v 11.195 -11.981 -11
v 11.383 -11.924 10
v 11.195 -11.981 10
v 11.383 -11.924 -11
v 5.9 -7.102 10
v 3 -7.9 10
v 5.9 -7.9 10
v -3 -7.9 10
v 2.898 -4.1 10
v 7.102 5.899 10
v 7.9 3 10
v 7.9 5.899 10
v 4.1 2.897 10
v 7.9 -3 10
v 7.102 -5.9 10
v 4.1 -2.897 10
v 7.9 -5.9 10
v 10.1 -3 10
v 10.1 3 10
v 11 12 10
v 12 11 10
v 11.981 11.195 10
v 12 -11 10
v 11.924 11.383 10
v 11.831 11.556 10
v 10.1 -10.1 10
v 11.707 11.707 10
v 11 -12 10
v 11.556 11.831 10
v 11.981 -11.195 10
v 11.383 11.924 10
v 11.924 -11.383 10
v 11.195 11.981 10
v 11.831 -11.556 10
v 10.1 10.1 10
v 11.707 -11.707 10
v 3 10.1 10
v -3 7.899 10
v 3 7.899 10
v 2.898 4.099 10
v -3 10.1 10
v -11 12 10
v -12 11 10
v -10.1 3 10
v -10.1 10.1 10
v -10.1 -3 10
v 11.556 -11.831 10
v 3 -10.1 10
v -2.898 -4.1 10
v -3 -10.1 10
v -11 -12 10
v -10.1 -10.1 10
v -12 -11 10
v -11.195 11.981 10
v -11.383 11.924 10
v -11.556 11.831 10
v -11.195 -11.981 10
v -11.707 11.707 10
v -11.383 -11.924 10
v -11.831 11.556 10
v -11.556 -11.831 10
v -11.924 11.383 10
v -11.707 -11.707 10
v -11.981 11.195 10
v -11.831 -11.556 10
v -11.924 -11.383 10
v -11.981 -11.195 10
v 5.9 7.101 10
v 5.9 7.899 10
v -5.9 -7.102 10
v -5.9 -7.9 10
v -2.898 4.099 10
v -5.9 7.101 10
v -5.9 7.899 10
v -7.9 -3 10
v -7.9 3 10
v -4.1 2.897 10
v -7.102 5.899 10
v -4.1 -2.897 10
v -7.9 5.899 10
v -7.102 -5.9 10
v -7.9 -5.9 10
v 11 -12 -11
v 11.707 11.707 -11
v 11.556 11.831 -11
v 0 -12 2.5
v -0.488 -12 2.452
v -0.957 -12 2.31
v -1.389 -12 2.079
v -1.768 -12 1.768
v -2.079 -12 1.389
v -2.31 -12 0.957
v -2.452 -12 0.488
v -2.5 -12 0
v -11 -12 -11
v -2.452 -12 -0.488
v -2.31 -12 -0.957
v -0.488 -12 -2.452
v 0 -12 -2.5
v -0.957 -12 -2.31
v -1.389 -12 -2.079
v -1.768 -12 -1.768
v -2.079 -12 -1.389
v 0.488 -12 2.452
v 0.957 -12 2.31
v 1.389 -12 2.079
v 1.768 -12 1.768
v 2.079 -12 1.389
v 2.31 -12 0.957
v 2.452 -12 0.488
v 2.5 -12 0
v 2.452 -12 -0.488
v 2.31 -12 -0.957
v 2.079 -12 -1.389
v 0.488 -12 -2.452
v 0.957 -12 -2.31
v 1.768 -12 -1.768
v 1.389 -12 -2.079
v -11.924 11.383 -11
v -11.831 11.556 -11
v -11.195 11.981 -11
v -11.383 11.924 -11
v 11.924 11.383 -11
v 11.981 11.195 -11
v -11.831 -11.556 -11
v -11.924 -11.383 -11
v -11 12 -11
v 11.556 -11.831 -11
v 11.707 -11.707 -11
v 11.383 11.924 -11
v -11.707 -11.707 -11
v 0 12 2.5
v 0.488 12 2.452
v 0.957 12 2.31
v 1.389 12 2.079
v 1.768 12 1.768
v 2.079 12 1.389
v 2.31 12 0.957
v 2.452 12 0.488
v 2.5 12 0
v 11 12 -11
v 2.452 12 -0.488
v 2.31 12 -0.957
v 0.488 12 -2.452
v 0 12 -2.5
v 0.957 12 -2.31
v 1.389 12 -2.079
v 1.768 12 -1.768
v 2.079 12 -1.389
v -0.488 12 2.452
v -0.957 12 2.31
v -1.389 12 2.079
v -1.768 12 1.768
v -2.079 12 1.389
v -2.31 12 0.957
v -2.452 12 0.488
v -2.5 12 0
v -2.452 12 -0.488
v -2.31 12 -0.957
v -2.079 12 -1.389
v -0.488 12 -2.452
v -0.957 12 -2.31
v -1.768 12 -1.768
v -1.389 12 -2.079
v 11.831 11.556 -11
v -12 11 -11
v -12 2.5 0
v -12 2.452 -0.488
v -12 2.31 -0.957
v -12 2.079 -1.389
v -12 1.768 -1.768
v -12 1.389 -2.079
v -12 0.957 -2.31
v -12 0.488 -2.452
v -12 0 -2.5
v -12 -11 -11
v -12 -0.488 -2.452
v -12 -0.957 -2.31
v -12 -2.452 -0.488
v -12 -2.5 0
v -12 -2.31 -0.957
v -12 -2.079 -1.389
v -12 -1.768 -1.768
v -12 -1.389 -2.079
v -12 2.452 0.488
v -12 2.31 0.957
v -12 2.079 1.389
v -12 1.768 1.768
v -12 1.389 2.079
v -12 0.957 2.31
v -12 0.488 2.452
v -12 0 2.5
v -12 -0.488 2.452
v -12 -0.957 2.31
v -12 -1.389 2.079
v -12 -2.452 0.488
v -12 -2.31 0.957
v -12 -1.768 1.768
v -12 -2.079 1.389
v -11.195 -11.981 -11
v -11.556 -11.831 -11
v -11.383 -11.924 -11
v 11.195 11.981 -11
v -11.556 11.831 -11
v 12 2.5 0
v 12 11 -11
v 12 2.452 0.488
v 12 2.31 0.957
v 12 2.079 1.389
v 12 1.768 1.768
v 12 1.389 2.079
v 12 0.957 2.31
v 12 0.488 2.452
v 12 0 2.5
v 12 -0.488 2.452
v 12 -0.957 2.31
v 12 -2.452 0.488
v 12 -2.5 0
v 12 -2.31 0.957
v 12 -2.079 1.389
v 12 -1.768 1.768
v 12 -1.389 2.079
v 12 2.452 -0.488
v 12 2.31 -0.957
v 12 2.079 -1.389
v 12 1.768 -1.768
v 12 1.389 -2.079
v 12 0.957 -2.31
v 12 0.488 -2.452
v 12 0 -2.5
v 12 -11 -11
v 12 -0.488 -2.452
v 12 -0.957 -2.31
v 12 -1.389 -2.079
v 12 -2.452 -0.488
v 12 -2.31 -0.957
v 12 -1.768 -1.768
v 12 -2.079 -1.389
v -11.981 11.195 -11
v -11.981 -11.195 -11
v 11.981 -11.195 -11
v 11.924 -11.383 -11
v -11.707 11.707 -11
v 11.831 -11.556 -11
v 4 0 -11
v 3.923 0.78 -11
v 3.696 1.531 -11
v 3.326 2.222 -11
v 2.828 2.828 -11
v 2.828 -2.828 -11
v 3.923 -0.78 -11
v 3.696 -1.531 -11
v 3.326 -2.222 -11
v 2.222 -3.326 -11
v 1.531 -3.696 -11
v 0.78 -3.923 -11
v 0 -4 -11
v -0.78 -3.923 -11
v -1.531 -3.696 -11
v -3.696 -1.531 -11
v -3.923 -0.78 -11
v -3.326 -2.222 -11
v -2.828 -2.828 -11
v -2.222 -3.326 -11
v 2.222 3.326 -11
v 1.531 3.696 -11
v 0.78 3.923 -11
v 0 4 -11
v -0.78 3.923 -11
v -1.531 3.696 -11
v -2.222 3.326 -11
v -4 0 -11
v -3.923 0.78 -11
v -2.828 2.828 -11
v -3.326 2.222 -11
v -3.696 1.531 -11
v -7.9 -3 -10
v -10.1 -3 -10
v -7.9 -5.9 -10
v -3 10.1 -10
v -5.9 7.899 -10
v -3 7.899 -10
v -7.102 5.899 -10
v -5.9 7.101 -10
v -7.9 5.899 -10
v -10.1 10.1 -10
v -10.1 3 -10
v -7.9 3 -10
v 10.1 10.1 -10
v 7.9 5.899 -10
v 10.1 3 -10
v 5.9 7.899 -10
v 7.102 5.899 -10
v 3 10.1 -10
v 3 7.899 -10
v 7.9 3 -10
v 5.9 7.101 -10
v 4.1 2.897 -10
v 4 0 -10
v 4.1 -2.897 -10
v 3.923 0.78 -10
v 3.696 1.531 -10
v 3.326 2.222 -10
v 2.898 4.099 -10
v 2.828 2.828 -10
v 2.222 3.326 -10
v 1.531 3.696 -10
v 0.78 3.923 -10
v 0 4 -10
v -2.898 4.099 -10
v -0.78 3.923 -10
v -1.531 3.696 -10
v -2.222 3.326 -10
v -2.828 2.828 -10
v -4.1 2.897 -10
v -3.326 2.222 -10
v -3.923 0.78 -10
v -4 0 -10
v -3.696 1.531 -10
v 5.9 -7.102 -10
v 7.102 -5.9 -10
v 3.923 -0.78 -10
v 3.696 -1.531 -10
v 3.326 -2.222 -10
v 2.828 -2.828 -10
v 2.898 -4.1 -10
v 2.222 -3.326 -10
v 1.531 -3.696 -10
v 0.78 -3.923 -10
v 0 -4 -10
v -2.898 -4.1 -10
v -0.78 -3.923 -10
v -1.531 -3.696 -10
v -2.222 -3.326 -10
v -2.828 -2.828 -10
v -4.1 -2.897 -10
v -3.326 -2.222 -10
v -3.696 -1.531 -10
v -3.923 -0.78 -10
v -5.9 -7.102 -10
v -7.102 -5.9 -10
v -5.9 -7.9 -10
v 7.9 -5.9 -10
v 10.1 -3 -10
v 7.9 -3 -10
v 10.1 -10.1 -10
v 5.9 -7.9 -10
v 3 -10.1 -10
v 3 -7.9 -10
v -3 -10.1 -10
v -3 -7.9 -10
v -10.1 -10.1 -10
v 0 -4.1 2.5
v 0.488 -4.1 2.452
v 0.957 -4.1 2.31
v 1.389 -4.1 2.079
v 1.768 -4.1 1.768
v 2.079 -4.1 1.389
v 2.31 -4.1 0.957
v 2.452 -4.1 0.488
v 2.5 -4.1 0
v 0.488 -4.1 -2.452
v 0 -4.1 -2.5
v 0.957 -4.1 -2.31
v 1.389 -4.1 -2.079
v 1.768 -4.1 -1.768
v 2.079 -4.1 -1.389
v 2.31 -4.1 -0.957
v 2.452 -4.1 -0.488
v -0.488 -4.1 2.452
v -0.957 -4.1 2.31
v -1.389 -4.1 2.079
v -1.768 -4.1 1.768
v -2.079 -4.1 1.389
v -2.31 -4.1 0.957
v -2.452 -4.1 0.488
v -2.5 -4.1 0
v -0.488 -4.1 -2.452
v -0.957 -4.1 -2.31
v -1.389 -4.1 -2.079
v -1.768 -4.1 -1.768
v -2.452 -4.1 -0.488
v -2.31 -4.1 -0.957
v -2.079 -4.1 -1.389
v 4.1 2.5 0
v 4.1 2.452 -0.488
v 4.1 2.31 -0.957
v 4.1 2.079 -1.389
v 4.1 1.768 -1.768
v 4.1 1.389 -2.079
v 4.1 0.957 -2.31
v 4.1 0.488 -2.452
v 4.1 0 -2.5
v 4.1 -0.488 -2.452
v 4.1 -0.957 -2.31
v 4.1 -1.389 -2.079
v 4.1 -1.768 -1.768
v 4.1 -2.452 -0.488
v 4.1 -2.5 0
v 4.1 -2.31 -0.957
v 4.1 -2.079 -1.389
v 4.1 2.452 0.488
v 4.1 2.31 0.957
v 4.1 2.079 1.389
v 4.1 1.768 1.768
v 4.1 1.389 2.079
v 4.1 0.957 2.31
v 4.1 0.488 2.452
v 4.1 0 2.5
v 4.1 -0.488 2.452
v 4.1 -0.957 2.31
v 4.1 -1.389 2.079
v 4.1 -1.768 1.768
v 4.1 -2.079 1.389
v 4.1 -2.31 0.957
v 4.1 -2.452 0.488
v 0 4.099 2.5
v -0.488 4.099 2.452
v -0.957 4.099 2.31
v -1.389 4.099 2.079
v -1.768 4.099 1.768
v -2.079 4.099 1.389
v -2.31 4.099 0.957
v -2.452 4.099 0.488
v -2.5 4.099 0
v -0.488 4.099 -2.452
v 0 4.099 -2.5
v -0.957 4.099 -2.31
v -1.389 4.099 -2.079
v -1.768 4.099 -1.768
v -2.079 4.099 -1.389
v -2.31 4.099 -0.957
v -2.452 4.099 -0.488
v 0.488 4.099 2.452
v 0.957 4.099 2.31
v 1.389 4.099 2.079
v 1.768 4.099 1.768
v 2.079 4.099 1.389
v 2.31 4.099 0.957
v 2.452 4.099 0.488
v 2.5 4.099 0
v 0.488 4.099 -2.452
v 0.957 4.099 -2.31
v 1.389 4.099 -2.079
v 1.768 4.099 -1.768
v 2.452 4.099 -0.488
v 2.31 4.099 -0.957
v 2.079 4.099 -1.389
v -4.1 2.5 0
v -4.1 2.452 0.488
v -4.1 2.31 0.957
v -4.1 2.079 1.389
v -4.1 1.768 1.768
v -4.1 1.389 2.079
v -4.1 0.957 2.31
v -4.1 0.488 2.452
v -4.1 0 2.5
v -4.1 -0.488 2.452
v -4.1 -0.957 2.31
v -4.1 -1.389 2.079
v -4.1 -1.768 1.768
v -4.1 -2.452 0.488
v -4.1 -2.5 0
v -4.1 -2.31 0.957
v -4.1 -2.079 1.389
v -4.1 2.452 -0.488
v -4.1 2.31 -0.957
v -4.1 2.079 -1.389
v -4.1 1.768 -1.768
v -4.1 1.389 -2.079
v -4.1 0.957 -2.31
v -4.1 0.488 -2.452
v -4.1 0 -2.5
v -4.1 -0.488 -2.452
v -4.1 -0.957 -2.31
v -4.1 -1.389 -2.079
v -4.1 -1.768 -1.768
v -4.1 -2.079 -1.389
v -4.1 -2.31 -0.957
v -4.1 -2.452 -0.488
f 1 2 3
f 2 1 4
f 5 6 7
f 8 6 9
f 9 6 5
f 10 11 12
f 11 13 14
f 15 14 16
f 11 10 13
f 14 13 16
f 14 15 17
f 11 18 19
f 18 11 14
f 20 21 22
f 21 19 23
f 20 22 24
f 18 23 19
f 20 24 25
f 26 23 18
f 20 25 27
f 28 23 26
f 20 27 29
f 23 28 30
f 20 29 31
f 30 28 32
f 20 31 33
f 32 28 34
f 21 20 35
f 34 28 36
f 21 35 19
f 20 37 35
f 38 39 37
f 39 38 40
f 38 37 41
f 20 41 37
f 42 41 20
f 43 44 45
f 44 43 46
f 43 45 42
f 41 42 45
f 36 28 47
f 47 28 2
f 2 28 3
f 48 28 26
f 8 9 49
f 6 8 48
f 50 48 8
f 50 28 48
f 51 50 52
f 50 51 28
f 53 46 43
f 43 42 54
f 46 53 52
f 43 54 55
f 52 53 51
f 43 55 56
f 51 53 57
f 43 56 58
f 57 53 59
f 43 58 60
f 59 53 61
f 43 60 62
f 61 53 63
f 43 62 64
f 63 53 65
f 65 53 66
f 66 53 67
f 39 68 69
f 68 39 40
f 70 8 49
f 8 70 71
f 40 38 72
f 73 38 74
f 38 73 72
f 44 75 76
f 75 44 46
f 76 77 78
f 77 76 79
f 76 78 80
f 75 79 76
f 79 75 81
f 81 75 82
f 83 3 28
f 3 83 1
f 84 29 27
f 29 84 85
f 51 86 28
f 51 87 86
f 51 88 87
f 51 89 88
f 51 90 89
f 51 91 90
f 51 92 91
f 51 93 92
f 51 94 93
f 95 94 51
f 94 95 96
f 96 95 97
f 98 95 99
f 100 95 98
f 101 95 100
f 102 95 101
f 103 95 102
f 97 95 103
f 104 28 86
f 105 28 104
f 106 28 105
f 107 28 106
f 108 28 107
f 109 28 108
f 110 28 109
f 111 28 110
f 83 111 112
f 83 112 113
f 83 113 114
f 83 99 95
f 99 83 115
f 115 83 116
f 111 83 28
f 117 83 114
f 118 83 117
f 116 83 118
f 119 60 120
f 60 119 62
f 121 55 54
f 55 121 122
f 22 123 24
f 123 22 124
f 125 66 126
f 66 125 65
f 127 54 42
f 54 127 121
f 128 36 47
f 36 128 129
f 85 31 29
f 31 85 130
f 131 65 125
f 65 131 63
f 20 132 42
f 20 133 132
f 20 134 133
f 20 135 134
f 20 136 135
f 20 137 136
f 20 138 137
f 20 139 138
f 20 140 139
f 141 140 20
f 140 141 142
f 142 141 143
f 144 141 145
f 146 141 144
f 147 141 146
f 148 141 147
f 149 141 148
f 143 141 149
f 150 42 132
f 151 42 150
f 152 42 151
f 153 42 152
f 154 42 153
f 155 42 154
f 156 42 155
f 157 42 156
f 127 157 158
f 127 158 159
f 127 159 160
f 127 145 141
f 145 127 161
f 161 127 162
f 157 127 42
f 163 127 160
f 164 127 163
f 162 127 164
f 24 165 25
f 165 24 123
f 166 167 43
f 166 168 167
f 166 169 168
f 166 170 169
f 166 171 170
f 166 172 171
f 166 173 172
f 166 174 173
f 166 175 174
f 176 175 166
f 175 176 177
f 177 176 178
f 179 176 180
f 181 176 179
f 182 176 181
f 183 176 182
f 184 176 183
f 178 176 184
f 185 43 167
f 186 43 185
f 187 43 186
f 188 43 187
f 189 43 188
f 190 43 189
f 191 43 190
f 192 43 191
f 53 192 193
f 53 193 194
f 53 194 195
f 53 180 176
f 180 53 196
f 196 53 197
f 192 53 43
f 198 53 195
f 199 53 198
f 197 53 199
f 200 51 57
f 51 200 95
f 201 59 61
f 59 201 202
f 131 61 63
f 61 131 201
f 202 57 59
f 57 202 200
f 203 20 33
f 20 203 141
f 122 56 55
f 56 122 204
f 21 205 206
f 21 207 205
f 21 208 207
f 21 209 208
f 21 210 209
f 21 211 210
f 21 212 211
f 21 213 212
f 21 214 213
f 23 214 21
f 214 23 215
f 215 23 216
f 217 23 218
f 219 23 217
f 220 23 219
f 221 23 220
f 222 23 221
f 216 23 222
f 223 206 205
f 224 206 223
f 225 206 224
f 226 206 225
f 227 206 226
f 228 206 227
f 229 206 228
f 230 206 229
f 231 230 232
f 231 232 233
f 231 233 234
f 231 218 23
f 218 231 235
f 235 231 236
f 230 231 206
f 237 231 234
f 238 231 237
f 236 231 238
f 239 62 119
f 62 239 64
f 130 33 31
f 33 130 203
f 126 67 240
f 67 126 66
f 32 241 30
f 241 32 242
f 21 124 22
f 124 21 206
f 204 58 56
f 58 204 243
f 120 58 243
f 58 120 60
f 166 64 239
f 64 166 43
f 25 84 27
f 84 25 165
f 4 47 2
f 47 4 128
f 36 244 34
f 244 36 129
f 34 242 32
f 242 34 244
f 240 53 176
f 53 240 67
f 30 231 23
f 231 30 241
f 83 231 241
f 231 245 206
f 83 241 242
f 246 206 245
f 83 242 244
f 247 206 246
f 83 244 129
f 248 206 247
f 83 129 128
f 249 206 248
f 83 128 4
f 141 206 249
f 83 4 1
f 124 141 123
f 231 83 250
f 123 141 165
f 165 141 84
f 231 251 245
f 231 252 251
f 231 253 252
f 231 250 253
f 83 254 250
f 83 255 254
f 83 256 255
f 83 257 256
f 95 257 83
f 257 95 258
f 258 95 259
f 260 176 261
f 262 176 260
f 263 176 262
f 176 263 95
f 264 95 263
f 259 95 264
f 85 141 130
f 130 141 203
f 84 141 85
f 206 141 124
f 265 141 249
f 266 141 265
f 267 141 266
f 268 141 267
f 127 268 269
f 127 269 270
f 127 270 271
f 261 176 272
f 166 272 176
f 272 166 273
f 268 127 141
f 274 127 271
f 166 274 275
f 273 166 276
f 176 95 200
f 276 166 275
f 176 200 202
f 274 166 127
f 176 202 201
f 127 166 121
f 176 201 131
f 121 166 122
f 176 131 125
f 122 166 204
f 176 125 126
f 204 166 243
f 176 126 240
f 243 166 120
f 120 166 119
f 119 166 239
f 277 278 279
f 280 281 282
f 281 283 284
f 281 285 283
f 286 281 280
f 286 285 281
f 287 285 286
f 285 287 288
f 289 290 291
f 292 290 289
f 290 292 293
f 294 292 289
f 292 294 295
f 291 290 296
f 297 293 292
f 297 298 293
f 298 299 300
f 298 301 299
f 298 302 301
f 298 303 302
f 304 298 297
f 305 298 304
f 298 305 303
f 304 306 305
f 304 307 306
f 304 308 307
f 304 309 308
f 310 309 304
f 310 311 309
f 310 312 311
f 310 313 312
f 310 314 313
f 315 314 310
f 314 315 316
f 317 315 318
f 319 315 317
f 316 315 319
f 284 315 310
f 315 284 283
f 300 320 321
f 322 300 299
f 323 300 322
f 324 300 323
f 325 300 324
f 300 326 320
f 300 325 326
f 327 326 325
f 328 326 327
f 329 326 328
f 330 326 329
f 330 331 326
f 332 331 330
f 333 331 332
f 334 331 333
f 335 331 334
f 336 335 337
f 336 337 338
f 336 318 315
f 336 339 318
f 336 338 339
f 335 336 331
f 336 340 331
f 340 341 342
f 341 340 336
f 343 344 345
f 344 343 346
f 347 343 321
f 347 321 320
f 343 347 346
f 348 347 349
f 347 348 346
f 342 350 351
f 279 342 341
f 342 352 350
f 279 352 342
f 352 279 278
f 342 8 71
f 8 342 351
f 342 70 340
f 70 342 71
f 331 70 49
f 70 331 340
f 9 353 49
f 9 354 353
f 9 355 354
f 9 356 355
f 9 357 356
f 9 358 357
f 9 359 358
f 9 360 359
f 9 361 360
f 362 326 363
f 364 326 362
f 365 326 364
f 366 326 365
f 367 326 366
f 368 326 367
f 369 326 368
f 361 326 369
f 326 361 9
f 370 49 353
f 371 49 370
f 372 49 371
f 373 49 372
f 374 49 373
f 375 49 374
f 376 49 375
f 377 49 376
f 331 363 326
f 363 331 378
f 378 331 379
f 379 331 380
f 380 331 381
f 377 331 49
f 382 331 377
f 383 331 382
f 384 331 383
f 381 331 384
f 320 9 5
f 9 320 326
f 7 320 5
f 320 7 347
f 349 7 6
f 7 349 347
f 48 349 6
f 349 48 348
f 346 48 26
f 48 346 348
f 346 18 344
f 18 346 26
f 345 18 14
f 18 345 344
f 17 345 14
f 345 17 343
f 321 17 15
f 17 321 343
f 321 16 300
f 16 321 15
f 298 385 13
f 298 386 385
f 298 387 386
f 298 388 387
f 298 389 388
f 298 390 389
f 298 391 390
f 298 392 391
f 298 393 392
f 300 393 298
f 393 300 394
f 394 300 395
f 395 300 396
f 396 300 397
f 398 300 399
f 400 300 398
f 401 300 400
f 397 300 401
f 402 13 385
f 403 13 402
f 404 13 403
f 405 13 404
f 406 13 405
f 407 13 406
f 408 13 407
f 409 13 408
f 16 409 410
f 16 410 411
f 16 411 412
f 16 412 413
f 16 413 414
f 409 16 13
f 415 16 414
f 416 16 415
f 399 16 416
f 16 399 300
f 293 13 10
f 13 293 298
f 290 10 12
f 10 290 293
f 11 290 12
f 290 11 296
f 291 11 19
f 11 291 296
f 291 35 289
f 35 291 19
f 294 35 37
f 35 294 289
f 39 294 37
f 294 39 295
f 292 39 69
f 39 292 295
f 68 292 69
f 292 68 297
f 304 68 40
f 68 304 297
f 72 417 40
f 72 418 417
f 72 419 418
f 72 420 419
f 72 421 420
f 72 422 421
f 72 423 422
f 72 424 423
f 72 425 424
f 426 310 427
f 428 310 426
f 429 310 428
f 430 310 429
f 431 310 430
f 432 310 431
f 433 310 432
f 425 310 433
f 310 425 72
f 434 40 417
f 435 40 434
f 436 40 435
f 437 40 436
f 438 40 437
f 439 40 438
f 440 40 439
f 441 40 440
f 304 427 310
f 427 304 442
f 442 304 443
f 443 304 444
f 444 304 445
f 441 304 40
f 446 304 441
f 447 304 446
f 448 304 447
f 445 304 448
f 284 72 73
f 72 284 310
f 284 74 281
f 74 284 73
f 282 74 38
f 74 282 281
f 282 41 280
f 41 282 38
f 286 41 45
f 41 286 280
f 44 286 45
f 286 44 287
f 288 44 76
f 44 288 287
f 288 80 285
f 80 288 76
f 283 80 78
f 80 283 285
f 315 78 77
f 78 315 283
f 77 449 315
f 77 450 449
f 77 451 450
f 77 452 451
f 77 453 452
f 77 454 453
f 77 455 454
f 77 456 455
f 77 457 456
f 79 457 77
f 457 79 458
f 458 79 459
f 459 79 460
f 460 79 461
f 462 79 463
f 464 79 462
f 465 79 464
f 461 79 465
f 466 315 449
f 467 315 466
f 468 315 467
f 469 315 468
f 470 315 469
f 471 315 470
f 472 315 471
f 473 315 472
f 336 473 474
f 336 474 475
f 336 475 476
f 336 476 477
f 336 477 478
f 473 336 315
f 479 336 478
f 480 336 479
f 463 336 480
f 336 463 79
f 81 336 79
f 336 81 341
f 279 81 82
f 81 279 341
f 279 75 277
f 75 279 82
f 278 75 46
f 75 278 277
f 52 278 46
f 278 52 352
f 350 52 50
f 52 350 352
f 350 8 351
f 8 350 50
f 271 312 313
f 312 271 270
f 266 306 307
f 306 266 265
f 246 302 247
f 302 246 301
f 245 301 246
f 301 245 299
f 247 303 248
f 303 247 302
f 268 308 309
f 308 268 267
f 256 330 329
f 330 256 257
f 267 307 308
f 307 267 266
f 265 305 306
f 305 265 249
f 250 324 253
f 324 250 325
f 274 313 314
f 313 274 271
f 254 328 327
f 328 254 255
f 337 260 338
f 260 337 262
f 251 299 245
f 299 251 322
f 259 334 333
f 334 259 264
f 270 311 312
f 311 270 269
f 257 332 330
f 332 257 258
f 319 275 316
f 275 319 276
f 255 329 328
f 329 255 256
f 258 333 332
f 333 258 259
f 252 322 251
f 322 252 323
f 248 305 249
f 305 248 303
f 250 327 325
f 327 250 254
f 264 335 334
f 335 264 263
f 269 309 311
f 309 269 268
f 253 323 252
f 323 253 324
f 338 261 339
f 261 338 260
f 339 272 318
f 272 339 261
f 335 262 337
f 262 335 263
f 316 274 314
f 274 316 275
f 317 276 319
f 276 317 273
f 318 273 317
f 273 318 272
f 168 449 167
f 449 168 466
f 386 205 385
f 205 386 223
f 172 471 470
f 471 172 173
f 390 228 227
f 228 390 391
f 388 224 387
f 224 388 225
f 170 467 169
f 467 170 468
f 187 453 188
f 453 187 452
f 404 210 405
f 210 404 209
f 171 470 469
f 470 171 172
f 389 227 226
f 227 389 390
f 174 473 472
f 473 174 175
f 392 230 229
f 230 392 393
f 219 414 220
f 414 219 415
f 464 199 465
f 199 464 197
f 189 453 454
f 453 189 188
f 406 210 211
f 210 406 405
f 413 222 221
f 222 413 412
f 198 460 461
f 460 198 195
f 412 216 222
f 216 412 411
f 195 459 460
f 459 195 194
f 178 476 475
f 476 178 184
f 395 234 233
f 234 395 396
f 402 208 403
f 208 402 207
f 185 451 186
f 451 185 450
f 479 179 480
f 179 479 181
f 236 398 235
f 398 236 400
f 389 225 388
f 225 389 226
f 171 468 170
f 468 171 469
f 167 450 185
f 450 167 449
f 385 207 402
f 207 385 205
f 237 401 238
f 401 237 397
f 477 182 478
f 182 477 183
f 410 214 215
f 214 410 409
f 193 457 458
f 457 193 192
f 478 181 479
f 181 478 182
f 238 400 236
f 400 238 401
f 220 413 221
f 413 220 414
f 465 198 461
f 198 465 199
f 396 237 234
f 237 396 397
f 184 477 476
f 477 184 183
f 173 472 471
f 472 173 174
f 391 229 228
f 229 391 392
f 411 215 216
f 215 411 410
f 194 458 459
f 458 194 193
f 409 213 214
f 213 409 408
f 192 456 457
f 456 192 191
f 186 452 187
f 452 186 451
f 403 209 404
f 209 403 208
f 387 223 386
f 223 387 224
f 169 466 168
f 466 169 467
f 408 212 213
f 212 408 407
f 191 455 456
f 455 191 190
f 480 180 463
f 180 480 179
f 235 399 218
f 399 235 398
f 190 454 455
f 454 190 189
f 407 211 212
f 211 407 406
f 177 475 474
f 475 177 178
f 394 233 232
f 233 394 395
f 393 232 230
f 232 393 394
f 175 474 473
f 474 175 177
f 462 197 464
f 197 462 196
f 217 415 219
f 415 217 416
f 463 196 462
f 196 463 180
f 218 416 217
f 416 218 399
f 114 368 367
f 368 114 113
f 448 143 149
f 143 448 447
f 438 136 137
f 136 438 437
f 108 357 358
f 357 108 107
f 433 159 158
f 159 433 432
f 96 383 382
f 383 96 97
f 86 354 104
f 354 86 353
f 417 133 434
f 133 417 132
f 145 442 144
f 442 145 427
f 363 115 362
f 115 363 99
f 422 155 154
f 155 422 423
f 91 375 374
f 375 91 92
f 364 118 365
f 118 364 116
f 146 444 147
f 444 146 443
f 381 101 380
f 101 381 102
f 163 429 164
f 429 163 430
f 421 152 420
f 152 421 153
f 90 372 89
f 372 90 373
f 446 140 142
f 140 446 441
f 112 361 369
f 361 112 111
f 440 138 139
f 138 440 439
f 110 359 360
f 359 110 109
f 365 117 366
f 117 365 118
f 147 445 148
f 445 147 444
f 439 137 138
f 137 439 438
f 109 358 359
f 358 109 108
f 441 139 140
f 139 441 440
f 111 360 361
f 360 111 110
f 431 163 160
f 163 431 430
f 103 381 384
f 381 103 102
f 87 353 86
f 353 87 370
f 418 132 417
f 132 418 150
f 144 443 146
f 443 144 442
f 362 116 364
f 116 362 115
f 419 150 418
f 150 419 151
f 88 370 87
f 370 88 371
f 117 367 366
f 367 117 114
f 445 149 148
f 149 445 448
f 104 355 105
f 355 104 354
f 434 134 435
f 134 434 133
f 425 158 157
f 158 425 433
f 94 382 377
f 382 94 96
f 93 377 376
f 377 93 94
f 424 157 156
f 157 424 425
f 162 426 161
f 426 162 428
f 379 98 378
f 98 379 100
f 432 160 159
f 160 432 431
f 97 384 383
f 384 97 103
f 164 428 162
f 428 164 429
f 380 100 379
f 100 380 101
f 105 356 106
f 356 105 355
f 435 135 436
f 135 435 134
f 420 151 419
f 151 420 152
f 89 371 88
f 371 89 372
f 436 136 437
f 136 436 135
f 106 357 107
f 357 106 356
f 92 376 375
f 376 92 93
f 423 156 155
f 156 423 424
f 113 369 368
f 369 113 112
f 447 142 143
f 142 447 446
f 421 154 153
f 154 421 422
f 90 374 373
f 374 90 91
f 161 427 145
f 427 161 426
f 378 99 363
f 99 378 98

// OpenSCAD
$fn = 32;

outer_size = 24;
drill_size = 5;

module profile_2020(h) {
    translate([-10, -10, -h/2])          // center=true
        linear_extrude(h)
            offset(delta=0.1)        // 0.1mm clearance
                resize([20, 20, 0])  // Should be noop, but make sure it's exactly 20mm
                    import("2020-profile.dxf");
}

difference() {
    height = 21;

    // Rounded cube
    translate([0, 0, -11])
        linear_extrude(height)
            offset(r=1) offset(delta=-1)
                square([outer_size, outer_size], center=true);

    // Profile negative
    translate([0, 0, 0])
        profile_2020(20);

    // Top hole
    cylinder(h=outer_size, d=8, center=true);

    // Side holes
    rotate([0, 90, 0])
        cylinder(h=outer_size, d=drill_size, center=true);
    rotate([90, 90, 0])
        cylinder(h=outer_size, d=drill_size, center=true);
}
